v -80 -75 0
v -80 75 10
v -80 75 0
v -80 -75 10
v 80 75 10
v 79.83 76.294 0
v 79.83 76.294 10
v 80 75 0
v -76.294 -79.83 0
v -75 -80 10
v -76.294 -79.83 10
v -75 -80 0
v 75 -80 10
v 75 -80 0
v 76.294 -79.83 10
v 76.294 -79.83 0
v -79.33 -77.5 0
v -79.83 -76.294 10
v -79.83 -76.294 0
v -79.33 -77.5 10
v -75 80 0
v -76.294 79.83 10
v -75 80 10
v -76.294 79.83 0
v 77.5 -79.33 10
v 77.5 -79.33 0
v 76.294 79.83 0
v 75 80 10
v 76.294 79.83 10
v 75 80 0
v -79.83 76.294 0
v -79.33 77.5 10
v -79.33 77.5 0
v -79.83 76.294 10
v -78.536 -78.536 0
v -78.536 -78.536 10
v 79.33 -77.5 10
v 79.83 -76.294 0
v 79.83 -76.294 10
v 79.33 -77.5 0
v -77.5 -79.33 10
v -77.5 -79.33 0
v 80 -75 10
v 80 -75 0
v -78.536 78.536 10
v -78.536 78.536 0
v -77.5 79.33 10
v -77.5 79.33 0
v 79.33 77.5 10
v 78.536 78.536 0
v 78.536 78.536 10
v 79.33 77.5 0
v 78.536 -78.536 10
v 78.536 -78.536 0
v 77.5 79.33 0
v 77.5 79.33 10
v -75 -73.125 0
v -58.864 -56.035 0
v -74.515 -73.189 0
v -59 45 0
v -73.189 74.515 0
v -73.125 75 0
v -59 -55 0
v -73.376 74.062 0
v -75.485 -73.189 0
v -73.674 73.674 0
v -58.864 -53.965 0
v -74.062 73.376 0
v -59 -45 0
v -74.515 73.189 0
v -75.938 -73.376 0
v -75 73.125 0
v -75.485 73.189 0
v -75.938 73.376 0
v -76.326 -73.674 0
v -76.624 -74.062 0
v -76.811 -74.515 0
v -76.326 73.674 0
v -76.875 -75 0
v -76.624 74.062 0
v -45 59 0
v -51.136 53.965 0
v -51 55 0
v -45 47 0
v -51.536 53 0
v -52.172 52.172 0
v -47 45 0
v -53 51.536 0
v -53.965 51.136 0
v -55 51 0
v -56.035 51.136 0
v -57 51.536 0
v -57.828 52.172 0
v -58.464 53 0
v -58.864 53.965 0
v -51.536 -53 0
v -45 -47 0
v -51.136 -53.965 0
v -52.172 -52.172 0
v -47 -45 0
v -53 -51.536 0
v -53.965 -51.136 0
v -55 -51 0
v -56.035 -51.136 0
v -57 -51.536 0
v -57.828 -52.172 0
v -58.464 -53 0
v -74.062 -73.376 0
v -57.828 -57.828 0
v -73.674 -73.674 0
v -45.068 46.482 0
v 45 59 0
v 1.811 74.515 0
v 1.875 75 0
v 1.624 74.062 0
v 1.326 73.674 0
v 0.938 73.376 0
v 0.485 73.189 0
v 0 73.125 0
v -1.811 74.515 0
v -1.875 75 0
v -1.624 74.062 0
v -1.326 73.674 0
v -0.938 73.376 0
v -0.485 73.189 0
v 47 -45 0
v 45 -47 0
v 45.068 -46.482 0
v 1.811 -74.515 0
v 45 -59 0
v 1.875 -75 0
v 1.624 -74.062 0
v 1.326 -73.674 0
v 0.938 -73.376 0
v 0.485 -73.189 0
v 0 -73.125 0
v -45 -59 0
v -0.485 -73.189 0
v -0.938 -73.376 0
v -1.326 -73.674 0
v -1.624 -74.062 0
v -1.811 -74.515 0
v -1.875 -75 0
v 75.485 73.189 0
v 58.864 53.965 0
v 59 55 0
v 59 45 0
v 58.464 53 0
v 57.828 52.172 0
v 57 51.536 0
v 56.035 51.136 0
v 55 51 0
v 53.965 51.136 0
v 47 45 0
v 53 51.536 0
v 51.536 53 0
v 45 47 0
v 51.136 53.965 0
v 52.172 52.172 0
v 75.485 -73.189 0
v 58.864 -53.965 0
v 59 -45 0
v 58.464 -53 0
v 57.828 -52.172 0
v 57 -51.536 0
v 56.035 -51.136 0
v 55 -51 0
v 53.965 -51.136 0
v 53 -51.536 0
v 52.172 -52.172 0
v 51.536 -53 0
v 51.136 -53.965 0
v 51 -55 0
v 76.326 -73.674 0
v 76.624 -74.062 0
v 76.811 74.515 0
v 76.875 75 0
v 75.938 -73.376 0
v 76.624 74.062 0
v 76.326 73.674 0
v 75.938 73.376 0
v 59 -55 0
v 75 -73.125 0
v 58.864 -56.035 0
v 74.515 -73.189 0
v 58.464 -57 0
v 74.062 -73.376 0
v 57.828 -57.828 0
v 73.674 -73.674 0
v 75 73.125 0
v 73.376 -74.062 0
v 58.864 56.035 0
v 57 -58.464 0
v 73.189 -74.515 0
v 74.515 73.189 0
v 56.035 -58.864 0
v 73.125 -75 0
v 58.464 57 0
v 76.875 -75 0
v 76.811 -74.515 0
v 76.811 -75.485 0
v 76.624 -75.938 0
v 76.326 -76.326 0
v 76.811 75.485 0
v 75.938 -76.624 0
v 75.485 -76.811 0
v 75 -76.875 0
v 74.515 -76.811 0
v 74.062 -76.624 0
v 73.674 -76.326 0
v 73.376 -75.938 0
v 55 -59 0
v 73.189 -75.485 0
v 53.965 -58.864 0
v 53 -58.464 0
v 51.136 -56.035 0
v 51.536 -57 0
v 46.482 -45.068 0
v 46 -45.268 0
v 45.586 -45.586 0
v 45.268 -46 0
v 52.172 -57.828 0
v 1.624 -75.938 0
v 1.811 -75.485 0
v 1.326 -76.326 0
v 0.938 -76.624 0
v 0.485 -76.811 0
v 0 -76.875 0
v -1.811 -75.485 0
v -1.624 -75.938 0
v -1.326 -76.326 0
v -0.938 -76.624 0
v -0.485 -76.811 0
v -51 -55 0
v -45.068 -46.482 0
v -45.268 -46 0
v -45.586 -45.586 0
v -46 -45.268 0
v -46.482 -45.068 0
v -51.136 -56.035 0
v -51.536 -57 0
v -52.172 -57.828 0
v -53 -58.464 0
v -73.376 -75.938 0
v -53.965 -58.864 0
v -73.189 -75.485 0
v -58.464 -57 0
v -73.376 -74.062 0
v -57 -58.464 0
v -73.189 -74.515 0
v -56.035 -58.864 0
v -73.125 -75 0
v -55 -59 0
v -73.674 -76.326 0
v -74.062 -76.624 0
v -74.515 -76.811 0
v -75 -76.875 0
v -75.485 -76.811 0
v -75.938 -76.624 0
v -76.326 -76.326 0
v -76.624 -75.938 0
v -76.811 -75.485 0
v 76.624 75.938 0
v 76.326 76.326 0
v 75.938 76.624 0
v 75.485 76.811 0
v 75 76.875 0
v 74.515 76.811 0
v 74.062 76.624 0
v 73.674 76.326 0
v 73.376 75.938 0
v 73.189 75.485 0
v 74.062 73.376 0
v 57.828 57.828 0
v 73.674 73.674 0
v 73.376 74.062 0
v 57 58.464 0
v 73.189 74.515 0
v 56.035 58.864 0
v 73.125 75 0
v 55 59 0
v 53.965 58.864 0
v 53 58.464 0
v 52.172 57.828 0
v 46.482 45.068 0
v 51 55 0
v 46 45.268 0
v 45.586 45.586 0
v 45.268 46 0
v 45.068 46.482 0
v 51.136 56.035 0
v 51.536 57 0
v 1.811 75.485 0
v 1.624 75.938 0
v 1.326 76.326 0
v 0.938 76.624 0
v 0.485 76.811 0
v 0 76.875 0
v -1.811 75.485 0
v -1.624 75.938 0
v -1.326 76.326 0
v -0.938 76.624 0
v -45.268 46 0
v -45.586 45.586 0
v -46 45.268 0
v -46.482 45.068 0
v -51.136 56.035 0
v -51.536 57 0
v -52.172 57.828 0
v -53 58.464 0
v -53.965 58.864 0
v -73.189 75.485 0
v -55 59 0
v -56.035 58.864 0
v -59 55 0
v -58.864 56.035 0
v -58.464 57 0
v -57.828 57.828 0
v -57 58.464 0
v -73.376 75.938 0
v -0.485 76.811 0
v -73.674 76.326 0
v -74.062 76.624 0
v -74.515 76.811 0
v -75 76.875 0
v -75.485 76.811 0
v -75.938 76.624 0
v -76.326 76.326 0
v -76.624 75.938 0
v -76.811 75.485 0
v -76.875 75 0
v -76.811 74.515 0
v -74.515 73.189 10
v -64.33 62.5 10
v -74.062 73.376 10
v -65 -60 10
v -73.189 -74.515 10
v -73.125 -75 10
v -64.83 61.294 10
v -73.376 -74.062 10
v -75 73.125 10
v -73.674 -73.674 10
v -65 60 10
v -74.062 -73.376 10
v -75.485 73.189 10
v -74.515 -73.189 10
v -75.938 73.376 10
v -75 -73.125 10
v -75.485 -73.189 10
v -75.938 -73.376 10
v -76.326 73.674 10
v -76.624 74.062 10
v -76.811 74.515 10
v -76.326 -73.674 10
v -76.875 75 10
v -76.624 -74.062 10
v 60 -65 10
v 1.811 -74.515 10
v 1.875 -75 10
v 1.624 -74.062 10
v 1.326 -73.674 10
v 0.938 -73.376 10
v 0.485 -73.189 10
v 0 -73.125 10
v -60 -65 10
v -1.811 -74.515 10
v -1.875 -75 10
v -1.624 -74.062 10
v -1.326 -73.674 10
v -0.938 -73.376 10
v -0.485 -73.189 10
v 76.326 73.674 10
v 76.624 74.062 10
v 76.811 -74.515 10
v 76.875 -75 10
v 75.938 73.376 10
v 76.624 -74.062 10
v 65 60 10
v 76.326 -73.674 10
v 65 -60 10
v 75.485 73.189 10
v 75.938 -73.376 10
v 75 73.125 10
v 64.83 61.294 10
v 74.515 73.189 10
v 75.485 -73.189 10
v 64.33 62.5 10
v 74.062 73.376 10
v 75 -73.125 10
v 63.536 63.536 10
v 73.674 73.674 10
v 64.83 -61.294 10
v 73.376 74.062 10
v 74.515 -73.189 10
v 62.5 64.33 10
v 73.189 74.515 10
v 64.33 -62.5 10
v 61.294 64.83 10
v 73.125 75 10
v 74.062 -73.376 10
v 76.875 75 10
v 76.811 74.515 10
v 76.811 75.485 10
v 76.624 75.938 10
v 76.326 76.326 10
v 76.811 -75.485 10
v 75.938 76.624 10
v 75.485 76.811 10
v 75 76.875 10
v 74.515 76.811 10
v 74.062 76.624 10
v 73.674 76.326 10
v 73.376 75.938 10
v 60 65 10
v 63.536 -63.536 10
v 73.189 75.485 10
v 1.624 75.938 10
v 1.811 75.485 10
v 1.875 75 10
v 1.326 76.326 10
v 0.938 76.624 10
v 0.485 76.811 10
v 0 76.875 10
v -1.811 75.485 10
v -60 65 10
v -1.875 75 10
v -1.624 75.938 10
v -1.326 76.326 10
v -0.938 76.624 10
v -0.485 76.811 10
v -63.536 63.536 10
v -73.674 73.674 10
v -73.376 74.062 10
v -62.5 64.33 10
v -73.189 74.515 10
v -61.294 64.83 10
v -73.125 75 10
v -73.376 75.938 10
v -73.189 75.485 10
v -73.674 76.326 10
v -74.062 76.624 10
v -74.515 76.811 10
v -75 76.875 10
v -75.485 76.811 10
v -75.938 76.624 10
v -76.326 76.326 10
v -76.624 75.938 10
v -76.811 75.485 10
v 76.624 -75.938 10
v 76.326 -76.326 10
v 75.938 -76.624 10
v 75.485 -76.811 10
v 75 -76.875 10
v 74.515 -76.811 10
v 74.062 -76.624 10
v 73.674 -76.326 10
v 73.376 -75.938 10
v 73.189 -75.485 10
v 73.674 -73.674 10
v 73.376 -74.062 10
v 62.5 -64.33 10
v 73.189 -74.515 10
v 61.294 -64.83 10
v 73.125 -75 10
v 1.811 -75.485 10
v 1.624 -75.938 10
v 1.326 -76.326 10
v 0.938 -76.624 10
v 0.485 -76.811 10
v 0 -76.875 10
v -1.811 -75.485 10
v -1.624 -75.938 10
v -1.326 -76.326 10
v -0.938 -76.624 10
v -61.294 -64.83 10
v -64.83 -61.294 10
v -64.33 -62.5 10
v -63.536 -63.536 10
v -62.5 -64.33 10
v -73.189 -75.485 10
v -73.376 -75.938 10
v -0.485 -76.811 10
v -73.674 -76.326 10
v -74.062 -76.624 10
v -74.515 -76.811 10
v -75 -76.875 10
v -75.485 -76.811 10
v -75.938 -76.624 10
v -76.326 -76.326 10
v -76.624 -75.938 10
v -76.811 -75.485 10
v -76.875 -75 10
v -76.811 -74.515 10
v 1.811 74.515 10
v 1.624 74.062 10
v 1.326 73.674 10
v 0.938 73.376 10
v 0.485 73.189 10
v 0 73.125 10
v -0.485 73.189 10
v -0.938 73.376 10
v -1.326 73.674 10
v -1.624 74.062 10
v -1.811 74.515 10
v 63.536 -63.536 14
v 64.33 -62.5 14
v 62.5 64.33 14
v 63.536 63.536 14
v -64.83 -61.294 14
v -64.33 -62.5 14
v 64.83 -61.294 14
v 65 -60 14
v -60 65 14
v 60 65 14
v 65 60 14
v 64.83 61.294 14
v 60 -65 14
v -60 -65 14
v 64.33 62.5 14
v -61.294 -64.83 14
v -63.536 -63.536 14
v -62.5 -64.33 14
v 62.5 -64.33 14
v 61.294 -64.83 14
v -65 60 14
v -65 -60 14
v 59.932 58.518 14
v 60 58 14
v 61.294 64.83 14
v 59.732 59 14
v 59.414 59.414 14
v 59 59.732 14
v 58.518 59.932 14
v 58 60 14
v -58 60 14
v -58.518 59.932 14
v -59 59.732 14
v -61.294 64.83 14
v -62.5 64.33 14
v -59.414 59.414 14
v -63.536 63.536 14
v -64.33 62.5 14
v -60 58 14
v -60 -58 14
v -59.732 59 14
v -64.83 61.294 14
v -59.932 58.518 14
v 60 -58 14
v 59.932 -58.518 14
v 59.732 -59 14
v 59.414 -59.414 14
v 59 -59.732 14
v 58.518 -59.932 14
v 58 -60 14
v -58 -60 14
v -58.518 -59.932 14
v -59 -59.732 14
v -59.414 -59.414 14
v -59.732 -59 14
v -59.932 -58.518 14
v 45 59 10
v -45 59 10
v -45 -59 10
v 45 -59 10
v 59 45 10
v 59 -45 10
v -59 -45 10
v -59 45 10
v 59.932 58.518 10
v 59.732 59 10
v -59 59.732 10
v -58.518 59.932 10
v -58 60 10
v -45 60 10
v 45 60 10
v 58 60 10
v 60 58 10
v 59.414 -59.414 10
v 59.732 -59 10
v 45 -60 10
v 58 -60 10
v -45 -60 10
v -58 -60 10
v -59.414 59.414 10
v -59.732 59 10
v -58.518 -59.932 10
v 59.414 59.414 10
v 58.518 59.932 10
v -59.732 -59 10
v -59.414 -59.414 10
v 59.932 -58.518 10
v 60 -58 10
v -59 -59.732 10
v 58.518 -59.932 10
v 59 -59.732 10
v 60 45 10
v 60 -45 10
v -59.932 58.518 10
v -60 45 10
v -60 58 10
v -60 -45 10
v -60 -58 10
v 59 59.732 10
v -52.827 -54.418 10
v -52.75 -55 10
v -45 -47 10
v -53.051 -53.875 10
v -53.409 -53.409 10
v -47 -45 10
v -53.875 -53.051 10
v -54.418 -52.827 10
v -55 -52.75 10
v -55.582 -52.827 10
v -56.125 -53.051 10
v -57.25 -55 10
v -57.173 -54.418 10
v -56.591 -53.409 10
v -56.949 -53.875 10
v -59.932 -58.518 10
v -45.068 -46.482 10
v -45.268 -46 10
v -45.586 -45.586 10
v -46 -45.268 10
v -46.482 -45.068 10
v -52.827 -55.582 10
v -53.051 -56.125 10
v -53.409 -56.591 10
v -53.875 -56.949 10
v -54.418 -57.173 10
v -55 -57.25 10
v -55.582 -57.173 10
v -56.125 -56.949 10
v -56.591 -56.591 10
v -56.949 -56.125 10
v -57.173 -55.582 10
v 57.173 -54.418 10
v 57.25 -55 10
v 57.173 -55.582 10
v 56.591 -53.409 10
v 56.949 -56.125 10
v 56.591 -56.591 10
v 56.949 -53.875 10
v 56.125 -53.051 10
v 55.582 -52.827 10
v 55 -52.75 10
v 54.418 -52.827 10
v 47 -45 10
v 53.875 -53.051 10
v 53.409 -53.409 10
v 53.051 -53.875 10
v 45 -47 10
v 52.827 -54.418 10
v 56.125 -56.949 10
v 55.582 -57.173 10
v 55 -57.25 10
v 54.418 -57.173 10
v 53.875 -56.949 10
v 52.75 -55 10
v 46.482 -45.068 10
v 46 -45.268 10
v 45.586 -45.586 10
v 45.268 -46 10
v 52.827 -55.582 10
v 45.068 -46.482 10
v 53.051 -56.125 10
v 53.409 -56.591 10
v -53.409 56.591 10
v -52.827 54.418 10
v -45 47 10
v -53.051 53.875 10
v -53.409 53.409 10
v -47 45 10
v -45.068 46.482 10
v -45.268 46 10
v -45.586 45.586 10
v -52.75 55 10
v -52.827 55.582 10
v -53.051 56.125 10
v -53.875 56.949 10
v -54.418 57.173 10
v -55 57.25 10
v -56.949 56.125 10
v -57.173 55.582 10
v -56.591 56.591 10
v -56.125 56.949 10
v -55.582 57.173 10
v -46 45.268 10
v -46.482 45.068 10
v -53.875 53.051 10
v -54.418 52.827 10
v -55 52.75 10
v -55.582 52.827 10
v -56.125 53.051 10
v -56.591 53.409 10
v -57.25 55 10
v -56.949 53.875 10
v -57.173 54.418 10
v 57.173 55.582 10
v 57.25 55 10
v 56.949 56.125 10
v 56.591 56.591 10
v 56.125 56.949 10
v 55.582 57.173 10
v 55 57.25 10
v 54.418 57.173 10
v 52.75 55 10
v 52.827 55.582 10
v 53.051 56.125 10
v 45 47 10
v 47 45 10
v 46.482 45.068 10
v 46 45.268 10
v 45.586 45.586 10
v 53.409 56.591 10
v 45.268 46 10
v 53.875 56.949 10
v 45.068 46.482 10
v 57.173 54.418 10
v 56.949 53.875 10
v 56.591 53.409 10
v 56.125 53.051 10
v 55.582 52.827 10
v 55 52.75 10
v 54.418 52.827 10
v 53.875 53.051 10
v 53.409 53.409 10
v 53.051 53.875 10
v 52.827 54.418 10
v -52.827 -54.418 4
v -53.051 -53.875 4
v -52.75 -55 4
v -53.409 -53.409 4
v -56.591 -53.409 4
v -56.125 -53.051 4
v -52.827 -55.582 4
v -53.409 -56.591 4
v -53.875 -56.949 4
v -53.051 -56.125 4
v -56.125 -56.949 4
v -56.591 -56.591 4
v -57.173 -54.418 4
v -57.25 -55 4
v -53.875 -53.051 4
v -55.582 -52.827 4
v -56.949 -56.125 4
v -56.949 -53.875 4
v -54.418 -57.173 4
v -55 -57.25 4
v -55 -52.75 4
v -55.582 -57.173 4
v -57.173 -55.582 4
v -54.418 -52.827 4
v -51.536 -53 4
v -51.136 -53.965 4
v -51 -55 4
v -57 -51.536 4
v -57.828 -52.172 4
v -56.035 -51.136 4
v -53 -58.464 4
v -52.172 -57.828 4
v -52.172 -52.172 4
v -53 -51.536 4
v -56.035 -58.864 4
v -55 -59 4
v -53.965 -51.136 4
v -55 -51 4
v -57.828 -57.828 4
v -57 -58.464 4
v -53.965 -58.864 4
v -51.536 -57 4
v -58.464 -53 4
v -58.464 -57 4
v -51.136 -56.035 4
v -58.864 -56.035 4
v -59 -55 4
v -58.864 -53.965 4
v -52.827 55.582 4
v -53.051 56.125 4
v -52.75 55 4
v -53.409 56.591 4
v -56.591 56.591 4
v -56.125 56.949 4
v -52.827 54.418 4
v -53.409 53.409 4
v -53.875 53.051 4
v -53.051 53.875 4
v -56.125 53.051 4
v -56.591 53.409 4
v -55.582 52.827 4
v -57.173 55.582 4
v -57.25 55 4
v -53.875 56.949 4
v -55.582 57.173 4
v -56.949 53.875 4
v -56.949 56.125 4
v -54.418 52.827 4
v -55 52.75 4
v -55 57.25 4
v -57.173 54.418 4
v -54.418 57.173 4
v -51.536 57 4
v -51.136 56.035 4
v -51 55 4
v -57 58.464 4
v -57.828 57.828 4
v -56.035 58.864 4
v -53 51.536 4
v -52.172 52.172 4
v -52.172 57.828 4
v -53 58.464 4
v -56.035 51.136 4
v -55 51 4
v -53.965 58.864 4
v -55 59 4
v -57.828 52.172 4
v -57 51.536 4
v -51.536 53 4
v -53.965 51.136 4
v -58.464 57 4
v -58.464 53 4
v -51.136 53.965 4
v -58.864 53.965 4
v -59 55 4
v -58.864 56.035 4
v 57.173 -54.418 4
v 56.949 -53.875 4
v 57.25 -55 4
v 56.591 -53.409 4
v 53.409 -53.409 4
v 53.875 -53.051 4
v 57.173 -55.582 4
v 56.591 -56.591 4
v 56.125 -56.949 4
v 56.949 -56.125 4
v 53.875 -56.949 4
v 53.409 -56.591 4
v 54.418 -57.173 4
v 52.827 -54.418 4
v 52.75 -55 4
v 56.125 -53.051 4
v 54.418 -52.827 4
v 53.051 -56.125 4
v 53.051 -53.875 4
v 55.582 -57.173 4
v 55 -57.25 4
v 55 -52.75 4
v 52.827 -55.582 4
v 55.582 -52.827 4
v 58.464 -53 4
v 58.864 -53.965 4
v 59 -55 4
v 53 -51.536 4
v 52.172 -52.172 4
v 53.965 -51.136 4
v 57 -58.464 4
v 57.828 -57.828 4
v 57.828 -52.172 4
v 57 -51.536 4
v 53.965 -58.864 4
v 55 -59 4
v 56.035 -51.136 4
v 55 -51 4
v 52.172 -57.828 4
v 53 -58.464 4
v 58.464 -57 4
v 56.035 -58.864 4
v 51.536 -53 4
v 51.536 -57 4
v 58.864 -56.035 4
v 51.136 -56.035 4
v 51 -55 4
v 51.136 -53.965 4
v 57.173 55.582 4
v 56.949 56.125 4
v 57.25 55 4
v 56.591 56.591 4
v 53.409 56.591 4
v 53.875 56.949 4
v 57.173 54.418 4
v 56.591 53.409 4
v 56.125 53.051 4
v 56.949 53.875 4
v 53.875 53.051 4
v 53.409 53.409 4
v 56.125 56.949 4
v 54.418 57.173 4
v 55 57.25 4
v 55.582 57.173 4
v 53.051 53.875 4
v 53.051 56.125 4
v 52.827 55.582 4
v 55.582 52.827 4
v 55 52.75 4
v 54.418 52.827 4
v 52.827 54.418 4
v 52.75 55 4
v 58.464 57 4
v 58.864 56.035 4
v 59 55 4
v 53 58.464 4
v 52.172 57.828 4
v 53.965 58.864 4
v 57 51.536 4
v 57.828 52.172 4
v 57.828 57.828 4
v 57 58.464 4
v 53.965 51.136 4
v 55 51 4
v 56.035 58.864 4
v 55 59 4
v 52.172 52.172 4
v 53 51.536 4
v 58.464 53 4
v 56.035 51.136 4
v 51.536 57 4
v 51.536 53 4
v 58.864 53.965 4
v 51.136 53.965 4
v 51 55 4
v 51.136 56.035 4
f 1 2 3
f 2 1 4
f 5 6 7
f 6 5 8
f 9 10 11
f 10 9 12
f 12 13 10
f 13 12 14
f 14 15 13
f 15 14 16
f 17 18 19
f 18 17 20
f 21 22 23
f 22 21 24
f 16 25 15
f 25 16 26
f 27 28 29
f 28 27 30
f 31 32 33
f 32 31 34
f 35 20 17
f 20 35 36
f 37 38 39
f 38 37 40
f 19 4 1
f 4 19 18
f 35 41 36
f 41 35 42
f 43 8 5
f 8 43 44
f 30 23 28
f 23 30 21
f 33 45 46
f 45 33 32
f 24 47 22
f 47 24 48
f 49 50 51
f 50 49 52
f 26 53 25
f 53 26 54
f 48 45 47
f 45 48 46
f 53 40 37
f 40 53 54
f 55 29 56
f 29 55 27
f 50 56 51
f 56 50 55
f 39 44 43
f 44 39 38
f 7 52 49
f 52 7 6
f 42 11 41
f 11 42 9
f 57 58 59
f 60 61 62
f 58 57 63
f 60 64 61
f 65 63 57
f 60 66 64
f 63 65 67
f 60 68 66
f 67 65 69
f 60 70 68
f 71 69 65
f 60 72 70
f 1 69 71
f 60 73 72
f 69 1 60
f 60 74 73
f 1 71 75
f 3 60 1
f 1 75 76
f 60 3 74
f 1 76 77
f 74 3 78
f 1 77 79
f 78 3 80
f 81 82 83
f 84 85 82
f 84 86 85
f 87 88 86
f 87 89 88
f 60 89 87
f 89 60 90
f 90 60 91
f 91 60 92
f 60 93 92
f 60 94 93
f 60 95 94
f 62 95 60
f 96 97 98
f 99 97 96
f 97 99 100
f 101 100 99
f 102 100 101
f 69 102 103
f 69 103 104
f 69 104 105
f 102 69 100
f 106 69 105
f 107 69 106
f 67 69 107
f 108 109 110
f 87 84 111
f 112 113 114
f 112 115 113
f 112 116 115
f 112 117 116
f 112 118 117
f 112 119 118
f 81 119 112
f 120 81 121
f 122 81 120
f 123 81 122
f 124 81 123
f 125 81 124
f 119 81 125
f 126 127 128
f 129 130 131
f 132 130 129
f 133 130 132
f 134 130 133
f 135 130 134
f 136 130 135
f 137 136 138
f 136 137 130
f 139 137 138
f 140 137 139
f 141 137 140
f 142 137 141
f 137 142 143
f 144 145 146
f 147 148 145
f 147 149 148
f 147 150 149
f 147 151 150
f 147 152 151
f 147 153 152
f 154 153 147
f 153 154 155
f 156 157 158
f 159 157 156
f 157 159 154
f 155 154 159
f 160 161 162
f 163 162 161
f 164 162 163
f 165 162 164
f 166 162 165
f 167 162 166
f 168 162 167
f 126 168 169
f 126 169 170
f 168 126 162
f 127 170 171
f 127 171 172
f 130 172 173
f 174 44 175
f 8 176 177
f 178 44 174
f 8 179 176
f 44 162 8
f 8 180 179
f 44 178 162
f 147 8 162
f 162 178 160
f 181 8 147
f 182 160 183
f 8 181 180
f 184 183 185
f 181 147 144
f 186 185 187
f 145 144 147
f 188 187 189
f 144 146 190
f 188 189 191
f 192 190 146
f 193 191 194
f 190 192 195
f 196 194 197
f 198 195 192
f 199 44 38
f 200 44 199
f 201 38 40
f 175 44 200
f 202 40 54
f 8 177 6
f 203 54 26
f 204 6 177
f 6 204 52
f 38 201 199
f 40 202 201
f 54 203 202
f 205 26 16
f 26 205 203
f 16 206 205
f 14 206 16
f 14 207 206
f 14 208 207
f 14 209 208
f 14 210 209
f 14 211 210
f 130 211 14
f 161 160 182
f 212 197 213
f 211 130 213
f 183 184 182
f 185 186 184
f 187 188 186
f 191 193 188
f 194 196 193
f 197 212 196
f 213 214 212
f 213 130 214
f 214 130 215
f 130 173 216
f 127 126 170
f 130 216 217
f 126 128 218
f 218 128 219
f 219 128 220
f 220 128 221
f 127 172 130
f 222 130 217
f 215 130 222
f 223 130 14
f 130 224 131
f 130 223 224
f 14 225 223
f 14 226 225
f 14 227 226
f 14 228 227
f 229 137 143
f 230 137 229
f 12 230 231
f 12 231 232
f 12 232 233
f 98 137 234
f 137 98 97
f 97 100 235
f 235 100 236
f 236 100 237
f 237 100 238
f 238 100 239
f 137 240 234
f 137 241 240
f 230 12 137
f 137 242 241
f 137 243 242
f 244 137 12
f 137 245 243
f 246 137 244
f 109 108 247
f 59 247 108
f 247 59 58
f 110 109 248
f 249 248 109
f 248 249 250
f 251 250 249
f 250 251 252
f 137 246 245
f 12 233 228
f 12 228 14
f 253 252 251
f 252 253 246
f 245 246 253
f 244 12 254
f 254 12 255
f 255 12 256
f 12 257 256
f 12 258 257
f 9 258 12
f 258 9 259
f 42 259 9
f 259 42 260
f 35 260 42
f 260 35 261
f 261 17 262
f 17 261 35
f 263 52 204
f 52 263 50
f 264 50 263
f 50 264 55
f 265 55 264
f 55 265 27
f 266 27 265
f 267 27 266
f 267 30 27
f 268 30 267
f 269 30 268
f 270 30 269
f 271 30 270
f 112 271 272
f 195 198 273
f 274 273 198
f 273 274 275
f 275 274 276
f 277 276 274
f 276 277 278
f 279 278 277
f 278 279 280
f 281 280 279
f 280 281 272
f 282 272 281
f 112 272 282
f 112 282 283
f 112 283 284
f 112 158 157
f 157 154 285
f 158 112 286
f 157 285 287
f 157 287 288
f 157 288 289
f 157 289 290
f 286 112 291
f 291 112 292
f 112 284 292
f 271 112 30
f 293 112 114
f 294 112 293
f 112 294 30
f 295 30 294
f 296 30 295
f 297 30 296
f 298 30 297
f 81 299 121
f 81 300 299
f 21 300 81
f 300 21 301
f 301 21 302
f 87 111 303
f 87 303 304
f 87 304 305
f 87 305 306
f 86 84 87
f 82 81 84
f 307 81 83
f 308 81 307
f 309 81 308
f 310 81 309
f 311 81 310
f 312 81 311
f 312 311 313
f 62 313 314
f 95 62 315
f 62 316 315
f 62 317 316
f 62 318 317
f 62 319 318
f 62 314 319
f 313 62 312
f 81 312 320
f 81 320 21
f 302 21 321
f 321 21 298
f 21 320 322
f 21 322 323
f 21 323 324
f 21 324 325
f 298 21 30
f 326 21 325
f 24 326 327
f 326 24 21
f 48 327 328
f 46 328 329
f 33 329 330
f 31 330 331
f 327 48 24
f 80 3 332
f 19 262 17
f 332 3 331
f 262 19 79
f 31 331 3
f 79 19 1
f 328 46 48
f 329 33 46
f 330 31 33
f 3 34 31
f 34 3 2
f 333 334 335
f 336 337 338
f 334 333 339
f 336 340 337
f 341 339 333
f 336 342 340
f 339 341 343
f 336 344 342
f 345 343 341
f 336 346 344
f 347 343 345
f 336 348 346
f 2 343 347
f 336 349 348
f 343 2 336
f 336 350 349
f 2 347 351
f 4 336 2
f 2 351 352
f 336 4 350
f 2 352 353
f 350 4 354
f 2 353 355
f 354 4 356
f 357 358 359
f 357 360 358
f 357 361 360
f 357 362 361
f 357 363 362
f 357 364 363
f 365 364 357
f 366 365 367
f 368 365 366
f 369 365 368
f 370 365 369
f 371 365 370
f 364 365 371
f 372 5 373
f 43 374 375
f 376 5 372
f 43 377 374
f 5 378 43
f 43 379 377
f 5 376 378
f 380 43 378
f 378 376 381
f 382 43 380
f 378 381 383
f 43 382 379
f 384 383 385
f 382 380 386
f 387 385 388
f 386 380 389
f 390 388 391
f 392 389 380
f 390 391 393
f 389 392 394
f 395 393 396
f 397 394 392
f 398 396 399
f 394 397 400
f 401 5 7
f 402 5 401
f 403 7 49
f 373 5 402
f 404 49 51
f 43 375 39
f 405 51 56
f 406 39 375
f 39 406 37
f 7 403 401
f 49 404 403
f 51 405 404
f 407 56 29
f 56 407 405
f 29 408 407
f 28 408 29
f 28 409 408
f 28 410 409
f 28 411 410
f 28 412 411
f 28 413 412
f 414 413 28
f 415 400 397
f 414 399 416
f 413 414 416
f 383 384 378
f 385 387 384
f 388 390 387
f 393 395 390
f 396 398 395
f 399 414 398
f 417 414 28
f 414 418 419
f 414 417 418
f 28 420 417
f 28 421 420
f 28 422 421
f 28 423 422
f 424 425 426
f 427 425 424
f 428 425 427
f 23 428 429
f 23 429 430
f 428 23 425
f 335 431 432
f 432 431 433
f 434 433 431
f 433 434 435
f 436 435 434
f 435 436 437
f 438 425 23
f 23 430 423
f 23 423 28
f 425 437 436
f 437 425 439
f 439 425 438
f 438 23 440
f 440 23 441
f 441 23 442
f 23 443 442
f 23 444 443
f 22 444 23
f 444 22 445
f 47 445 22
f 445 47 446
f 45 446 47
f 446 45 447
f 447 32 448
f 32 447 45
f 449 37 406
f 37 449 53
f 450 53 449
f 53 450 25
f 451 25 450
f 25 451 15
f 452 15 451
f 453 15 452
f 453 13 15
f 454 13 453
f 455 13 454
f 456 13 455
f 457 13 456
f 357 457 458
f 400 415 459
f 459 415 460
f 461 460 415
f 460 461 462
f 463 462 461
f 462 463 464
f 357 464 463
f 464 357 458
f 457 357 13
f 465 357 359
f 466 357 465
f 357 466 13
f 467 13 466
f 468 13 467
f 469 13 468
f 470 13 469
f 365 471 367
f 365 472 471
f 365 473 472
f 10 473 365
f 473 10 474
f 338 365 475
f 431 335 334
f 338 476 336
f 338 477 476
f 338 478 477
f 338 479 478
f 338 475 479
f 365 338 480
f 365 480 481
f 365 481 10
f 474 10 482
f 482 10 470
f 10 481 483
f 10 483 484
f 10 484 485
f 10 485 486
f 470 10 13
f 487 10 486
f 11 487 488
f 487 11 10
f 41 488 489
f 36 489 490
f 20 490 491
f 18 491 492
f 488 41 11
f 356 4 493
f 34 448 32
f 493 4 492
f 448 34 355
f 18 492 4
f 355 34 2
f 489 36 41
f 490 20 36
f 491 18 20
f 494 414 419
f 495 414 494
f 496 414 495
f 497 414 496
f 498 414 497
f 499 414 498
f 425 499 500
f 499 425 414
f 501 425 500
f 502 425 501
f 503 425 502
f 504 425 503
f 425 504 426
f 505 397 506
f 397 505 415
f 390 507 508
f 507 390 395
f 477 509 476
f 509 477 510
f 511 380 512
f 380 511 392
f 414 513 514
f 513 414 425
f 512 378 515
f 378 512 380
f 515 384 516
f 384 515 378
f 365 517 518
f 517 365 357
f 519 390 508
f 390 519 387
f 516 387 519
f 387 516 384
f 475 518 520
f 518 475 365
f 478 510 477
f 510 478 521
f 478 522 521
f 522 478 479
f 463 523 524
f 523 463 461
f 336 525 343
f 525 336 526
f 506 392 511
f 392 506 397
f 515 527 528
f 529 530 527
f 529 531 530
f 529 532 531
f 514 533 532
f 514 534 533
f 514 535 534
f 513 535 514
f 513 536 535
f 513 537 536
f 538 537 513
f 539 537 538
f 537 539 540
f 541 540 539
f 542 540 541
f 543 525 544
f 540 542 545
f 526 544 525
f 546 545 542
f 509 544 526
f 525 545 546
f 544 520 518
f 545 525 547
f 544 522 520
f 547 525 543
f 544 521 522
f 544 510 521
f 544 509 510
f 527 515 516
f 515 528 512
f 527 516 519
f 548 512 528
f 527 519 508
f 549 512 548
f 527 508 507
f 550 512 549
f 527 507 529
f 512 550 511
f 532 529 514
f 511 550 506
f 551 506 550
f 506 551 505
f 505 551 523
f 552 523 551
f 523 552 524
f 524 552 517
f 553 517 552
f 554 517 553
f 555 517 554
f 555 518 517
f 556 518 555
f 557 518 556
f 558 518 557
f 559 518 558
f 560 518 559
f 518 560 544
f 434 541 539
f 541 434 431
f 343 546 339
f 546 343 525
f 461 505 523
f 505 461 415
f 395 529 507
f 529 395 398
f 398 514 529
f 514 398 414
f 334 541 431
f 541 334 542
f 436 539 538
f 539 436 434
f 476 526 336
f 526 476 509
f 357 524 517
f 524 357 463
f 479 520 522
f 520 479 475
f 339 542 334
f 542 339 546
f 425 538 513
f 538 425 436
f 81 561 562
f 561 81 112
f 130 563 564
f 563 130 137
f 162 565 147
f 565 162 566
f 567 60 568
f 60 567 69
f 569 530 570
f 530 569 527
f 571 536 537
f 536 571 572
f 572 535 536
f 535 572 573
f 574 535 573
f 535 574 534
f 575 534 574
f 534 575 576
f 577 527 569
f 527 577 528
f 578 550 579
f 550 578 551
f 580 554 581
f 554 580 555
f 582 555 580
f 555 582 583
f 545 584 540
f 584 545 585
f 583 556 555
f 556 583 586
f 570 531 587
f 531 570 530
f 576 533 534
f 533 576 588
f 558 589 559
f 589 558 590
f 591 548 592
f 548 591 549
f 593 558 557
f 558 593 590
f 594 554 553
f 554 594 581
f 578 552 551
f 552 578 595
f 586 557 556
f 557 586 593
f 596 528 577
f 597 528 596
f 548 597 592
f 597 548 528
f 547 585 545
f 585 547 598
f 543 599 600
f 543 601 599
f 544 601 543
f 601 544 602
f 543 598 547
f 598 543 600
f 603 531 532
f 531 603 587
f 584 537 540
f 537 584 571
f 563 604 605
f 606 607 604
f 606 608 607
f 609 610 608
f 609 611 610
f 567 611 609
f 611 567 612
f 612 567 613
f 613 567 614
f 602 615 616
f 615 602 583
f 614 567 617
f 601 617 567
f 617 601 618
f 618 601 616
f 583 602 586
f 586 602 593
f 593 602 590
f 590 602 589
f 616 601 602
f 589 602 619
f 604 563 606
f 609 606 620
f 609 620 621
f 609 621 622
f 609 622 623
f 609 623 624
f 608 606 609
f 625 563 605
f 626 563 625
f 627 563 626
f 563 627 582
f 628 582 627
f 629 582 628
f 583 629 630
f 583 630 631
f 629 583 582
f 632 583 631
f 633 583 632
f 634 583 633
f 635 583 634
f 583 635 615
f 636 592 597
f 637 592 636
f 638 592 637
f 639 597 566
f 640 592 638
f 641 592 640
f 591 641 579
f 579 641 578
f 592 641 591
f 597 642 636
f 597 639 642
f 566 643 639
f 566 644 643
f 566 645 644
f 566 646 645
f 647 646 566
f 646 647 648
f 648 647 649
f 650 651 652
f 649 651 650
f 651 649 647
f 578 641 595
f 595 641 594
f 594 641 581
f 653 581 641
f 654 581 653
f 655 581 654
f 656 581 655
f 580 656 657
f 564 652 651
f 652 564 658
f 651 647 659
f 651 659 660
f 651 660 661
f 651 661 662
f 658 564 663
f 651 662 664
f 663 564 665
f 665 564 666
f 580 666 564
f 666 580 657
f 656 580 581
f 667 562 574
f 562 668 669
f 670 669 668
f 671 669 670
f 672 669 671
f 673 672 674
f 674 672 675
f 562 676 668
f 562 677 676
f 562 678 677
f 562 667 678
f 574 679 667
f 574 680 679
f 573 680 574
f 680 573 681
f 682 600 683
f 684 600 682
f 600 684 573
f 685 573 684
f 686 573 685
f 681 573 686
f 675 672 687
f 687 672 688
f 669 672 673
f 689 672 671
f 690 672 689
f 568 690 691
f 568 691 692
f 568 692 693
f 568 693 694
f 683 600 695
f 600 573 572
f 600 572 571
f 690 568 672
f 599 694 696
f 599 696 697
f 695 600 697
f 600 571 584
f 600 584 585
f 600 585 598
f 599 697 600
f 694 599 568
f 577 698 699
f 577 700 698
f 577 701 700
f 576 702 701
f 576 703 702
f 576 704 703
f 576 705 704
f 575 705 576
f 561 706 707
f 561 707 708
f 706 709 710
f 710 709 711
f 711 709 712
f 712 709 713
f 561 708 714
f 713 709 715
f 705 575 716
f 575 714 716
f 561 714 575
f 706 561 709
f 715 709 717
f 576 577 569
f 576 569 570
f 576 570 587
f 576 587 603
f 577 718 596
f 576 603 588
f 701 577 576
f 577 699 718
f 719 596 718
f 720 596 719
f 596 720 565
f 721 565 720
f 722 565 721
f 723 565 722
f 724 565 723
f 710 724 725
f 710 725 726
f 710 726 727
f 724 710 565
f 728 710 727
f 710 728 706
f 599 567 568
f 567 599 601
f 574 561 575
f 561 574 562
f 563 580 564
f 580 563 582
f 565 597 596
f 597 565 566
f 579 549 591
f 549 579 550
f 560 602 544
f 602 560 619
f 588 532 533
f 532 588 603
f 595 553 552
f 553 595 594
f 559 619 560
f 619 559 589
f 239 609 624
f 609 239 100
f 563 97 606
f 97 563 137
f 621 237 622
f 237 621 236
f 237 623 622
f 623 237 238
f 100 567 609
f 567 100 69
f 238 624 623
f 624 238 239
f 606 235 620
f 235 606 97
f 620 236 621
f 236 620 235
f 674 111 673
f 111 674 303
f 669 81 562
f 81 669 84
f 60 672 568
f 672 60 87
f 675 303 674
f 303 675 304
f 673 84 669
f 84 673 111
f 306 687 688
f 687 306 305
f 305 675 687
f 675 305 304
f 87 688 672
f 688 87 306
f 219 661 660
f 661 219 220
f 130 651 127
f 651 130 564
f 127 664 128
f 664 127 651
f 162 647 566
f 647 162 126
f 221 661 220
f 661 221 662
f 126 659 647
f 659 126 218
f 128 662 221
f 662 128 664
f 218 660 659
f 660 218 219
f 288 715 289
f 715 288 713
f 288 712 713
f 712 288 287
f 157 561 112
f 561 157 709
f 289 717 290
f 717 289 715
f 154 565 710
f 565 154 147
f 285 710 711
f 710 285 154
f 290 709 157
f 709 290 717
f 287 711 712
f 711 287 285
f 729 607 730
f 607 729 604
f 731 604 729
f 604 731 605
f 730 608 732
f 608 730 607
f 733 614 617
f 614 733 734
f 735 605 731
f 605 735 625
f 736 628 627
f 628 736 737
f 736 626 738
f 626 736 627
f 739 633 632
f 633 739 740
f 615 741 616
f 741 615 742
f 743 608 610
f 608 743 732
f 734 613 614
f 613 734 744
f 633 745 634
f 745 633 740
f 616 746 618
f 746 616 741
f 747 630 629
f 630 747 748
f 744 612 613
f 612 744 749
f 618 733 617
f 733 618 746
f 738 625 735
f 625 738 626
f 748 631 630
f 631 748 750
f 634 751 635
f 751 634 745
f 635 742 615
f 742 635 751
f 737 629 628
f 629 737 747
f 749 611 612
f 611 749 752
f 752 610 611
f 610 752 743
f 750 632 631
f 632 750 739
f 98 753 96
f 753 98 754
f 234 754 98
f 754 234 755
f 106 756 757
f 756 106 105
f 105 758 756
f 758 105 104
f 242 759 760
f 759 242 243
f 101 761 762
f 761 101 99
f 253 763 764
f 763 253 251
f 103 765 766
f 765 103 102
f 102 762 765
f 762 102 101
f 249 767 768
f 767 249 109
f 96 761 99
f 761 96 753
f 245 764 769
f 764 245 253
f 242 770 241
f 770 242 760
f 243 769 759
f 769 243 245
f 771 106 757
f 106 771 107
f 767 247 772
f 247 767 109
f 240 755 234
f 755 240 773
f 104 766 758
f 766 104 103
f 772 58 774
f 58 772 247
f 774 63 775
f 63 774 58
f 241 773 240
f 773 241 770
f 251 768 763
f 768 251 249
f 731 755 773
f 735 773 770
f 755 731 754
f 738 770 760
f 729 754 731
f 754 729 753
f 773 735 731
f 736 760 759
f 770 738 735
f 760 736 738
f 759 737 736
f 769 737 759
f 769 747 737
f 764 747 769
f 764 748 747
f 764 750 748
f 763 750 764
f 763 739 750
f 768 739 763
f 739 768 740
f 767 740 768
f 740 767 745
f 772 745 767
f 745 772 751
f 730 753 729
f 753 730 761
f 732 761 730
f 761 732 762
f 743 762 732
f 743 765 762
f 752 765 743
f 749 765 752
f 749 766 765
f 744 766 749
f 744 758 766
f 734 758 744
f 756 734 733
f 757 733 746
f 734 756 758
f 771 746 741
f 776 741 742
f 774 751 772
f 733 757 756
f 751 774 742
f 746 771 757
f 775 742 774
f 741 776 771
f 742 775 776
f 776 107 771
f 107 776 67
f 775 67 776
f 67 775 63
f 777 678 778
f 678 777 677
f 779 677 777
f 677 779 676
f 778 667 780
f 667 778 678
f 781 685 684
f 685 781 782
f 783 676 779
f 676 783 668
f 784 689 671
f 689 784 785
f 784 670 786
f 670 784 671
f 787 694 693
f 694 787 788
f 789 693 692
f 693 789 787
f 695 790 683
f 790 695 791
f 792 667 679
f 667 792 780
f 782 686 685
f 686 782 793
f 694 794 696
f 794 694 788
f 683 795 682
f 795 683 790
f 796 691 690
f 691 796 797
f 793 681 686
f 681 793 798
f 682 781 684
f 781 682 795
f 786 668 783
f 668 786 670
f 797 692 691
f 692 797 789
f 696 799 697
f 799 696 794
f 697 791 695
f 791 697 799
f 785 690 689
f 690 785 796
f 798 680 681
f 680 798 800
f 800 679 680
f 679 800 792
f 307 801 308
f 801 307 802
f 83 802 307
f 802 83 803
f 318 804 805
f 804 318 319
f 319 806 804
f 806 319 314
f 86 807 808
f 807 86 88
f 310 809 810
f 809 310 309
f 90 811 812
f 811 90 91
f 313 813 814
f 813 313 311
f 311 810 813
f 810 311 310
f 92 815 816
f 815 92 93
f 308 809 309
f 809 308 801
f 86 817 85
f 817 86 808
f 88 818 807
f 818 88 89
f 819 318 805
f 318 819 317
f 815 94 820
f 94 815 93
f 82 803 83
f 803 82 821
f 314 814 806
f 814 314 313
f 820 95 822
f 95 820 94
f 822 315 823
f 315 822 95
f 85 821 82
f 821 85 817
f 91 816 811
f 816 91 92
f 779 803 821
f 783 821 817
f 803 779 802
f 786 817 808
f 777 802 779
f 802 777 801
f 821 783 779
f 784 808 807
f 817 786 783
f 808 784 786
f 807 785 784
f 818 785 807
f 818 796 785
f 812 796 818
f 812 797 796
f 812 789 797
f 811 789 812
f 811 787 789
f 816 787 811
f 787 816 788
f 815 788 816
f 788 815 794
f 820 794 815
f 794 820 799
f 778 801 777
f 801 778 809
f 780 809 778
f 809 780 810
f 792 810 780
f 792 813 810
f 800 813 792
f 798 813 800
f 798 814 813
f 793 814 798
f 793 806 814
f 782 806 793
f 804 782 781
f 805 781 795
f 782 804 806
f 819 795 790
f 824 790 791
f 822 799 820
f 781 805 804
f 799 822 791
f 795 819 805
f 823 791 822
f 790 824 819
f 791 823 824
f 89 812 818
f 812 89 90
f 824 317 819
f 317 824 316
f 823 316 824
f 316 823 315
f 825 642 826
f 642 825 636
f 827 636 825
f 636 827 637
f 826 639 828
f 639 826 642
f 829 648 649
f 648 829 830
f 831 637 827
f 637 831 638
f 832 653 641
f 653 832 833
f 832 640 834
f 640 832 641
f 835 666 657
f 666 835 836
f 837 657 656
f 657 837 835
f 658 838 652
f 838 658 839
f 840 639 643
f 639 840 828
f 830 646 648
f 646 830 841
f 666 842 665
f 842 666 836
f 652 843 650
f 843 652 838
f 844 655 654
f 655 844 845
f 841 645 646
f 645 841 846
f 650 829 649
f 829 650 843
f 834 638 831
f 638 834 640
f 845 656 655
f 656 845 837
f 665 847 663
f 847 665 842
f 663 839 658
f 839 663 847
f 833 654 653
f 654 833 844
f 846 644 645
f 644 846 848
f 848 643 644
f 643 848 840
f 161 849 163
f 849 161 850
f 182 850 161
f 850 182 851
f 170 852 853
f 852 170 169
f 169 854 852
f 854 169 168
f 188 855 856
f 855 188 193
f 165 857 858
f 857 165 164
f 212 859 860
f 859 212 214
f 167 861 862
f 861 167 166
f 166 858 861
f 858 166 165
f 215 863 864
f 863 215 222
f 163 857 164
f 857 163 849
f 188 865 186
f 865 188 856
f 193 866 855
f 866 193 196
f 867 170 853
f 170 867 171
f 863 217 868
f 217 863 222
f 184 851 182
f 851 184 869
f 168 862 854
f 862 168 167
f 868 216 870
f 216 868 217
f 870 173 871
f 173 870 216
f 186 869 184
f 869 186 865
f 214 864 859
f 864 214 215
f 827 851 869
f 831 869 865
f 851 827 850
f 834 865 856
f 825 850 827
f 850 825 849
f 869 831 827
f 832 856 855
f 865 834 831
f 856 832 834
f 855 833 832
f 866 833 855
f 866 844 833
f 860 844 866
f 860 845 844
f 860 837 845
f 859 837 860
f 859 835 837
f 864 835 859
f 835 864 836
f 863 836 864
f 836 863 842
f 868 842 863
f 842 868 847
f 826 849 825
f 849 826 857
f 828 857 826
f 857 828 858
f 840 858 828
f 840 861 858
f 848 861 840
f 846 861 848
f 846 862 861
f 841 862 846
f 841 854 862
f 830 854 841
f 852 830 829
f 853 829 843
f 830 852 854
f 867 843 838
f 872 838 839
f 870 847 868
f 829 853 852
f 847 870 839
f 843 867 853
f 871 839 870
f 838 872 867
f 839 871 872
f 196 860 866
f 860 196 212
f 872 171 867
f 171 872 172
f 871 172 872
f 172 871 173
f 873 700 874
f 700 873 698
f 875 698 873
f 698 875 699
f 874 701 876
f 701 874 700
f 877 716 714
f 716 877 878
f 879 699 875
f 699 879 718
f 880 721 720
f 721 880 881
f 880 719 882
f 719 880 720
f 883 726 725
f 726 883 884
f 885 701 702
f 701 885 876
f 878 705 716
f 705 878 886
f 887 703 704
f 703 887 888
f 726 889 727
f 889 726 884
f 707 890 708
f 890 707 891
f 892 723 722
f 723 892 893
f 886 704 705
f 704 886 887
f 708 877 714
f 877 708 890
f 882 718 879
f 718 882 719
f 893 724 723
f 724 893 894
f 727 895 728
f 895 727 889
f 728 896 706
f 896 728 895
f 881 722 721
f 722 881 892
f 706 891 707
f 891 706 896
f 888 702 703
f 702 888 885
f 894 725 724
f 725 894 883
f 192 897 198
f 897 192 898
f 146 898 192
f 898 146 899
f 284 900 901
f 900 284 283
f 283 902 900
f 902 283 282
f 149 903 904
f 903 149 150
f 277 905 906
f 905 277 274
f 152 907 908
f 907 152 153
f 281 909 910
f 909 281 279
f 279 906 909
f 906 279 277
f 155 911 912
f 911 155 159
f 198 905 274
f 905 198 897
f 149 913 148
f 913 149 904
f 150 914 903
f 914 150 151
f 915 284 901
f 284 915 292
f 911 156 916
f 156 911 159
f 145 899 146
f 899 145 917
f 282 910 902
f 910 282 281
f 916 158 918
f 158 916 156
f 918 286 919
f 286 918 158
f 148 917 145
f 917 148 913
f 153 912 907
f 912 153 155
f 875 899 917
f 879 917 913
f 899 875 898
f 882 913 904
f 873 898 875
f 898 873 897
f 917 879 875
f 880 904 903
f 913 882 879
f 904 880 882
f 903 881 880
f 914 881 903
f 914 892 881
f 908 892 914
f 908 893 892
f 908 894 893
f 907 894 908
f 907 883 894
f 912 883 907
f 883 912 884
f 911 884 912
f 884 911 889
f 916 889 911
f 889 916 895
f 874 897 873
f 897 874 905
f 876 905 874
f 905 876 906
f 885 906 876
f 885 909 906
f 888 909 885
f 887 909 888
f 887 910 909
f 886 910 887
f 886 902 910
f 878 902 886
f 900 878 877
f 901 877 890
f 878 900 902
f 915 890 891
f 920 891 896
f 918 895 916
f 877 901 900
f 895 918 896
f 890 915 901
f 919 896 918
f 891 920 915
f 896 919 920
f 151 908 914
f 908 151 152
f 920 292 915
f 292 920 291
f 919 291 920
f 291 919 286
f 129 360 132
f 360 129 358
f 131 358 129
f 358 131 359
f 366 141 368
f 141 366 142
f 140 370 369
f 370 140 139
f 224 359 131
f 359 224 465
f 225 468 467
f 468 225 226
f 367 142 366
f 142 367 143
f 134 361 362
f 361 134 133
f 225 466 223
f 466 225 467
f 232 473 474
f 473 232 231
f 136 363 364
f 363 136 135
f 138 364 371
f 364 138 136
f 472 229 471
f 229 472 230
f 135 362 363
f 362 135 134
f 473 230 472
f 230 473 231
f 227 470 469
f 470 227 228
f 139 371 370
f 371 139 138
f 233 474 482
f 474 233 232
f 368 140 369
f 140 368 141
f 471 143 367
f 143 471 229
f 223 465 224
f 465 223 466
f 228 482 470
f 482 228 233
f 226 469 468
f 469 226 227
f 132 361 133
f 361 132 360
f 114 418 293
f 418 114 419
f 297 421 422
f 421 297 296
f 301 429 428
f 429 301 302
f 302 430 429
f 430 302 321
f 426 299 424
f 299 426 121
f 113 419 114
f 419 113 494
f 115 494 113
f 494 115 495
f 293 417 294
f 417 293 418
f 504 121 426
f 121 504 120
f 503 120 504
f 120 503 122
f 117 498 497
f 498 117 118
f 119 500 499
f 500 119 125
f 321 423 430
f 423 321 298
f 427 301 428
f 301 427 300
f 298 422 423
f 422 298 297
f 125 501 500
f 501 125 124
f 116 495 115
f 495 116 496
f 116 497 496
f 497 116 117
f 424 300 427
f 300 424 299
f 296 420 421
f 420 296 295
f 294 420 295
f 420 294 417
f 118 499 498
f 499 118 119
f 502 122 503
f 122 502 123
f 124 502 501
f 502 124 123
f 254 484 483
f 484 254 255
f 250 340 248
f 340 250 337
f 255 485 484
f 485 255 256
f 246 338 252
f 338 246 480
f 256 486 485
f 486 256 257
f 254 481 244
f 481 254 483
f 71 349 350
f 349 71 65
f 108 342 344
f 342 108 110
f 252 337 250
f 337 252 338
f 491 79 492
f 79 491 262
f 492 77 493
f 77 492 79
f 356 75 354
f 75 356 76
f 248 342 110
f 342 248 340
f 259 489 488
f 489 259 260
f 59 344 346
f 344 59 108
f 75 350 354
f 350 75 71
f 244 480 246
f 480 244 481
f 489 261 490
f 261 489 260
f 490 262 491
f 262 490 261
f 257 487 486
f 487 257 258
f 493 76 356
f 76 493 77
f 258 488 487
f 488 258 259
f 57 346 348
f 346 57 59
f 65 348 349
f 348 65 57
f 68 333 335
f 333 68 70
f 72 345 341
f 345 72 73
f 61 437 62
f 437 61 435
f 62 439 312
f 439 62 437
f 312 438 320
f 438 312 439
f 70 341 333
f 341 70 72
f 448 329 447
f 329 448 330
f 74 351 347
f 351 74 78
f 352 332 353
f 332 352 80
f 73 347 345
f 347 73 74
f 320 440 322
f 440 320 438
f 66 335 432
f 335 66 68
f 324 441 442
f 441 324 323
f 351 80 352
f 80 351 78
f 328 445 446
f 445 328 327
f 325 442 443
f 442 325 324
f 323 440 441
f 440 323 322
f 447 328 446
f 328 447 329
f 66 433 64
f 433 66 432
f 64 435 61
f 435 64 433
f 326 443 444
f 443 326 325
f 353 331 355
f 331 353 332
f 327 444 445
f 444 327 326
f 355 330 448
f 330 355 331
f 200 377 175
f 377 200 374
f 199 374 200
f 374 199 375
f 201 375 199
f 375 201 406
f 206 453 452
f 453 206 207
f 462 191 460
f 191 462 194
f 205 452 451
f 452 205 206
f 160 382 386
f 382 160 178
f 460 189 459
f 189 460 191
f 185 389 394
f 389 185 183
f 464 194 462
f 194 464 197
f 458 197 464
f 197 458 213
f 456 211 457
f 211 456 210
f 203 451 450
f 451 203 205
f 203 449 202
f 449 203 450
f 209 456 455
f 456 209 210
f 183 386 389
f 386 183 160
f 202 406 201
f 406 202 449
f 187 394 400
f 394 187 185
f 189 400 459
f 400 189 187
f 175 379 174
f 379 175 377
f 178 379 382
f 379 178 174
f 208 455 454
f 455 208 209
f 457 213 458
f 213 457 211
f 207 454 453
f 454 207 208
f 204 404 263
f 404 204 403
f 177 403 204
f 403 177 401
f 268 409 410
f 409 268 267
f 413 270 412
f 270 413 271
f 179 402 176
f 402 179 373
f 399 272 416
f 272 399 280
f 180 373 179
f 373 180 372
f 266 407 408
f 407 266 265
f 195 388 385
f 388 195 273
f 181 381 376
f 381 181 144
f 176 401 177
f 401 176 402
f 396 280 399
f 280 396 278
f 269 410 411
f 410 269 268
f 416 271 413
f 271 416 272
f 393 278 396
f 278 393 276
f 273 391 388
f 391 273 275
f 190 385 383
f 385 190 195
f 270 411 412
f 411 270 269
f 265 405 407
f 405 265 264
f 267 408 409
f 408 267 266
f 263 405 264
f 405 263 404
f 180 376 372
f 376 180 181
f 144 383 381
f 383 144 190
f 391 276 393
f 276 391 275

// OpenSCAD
// file: ../OpenSCAD_Modules/cube_vround.scad
module cube_vround(
	size=[10,10,10],
	round_corners=[true,true,true,true],
	rounding=3,
	center_xy=false,
	center_z=false,
	attach=0,
	wall_attach=0,
	quality=2, //integer from 1 to infinity
)
{
	assert(len(size)==3);
	assert(len(round_corners)==4);
	assert(rounding>0);
	assert(rounding<=size[0]/2);
	assert(rounding<=size[1]/2);
	assert(quality>0);
	assert(attach>=0);
	assert(wall_attach>=0);
	height=size[2]+attach;
	cyl_r=rounding+wall_attach;
	cyl_mvx=size[0]/2-rounding;
	cyl_mvy=size[1]/2-rounding;
	cube_szx=size[0]/2;
	cube_szy=size[1]/2;
	cube_mvx=cube_szx/2+wall_attach;
	cube_mvy=cube_szy/2+wall_attach;
	translate([center_xy?0:cube_szx,center_xy?0:cube_szy,center_z?-attach/2:(size[2]-attach)/2])
		hull()
		{
			if(round_corners[0])
				translate([cyl_mvx,cyl_mvy])
					cylinder(r=cyl_r,h=height,$fn=12*quality,center=true);
			else
				translate([cube_mvx,cube_mvy])
					cube([cube_szx,cube_szy,height],center=true);
			if(round_corners[1])
				translate([cyl_mvx,-cyl_mvy])
					cylinder(r=cyl_r,h=height,$fn=12*quality,center=true);
			else
				translate([cube_mvx,-cube_mvy])
					cube([cube_szx,cube_szy,height],center=true);
			if(round_corners[2])
				translate([-cyl_mvx,-cyl_mvy])
					cylinder(r=cyl_r,h=height,$fn=12*quality,center=true);
			else
				translate([-cube_mvx,-cube_mvy])
					cube([cube_szx,cube_szy,height],center=true);
			if(round_corners[3])
				translate([-cyl_mvx,cyl_mvy])
					cylinder(r=cyl_r,h=height,$fn=12*quality,center=true);
			else
				translate([-cube_mvx,cube_mvy])
					cube([cube_szx,cube_szy,height],center=true);
		};
}

//example
cube_vround(round_corners=[true,false,true,false],
size=[10,20,6],
attach=0.1,
wall_attach=0.1,
rounding=3,
center_xy=true,center_z=false);
// main file
use <../OpenSCAD_Modules/cube_vround.scad>

module FanMount
(
	ext_size=[160,160,10],
	fan_ext_clip_size=[130,130,14],
	fan_int_size=[120,120,1],
	screw_hole_diam=3.75,
	corner_clip_shift=5,
	center_clip_shift=5,
	int_rounding=2,
	int_clip_size=[15,15],
	int_clip_hole_diam=4.5,
	int_clip_head_size=[8,4],
	int_clip_diff=[110,110],
	quality=2
)
{
	cutClr=1;
	rounding=5;

	difference()
	{
		union()
		{
			difference()
			{
				union()
				{
					//base
					cube_vround(size=ext_size,center_xy=true,quality=quality,rounding=rounding);
					//fan
					cube_vround(size=fan_ext_clip_size,center_xy=true,quality=quality,rounding=rounding);
				}
				//fan cut (bottom)
				translate([0,0,-cutClr])
				cube_vround(size=[fan_int_size[0]-2*fan_int_size[2],fan_int_size[1]-2*fan_int_size[2],fan_ext_clip_size[2]+2*cutClr],center_xy=true,quality=quality,rounding=int_rounding);
				//fan cut (bottom)
				translate([0,0,ext_size[2]])
				cube_vround(size=[fan_int_size[0],fan_int_size[1],fan_ext_clip_size[2]],center_xy=true,quality=quality,rounding=int_rounding);
			}
			//fan int clips
			for (i=[-1:2:1],j=[-1:2:1])
			translate([i*(fan_int_size[0]-int_clip_size[0]+cutClr)/2,j*(fan_int_size[1]-int_clip_size[1]+cutClr)/2,0])
			cube_vround(size=[int_clip_size[0]+cutClr,int_clip_size[1]+cutClr,ext_size[2]],center_xy=true,rounding=int_rounding,quality=quality,round_corners=[i<0&&j<0, i<0&&j>0, i>0&&j>0, i>0&&j<0]);
		}
		for (i=[-1:2:1],j=[-1:2:1])
		translate([i*int_clip_diff[0]/2,j*int_clip_diff[1]/2,-cutClr])
		{
			//fan internal clip - screw holes
			cylinder(d=int_clip_hole_diam,h=fan_ext_clip_size[2]+2*cutClr,center=false,$fn=quality*12);
			//fan internal clip - screw heads
			cylinder(d=int_clip_head_size[0],h=int_clip_head_size[1]+cutClr,center=false,$fn=quality*12);
		}
		//center clip holes
		for (j=[-1:2:1])
		translate([0,j*(ext_size[1]/2-center_clip_shift),ext_size[2]/2])
		cylinder(d=screw_hole_diam,h=ext_size[2]+2*cutClr,center=true,$fn=quality*12);
		//corner clip holes
		for (i=[-1:2:1],j=[-1:2:1])
		translate([i*(ext_size[0]/2-corner_clip_shift),j*(ext_size[1]/2-corner_clip_shift),ext_size[2]/2])
		cylinder(d=screw_hole_diam,h=ext_size[2]+2*cutClr,center=true,$fn=quality*12);
	}
}

FanMount();
